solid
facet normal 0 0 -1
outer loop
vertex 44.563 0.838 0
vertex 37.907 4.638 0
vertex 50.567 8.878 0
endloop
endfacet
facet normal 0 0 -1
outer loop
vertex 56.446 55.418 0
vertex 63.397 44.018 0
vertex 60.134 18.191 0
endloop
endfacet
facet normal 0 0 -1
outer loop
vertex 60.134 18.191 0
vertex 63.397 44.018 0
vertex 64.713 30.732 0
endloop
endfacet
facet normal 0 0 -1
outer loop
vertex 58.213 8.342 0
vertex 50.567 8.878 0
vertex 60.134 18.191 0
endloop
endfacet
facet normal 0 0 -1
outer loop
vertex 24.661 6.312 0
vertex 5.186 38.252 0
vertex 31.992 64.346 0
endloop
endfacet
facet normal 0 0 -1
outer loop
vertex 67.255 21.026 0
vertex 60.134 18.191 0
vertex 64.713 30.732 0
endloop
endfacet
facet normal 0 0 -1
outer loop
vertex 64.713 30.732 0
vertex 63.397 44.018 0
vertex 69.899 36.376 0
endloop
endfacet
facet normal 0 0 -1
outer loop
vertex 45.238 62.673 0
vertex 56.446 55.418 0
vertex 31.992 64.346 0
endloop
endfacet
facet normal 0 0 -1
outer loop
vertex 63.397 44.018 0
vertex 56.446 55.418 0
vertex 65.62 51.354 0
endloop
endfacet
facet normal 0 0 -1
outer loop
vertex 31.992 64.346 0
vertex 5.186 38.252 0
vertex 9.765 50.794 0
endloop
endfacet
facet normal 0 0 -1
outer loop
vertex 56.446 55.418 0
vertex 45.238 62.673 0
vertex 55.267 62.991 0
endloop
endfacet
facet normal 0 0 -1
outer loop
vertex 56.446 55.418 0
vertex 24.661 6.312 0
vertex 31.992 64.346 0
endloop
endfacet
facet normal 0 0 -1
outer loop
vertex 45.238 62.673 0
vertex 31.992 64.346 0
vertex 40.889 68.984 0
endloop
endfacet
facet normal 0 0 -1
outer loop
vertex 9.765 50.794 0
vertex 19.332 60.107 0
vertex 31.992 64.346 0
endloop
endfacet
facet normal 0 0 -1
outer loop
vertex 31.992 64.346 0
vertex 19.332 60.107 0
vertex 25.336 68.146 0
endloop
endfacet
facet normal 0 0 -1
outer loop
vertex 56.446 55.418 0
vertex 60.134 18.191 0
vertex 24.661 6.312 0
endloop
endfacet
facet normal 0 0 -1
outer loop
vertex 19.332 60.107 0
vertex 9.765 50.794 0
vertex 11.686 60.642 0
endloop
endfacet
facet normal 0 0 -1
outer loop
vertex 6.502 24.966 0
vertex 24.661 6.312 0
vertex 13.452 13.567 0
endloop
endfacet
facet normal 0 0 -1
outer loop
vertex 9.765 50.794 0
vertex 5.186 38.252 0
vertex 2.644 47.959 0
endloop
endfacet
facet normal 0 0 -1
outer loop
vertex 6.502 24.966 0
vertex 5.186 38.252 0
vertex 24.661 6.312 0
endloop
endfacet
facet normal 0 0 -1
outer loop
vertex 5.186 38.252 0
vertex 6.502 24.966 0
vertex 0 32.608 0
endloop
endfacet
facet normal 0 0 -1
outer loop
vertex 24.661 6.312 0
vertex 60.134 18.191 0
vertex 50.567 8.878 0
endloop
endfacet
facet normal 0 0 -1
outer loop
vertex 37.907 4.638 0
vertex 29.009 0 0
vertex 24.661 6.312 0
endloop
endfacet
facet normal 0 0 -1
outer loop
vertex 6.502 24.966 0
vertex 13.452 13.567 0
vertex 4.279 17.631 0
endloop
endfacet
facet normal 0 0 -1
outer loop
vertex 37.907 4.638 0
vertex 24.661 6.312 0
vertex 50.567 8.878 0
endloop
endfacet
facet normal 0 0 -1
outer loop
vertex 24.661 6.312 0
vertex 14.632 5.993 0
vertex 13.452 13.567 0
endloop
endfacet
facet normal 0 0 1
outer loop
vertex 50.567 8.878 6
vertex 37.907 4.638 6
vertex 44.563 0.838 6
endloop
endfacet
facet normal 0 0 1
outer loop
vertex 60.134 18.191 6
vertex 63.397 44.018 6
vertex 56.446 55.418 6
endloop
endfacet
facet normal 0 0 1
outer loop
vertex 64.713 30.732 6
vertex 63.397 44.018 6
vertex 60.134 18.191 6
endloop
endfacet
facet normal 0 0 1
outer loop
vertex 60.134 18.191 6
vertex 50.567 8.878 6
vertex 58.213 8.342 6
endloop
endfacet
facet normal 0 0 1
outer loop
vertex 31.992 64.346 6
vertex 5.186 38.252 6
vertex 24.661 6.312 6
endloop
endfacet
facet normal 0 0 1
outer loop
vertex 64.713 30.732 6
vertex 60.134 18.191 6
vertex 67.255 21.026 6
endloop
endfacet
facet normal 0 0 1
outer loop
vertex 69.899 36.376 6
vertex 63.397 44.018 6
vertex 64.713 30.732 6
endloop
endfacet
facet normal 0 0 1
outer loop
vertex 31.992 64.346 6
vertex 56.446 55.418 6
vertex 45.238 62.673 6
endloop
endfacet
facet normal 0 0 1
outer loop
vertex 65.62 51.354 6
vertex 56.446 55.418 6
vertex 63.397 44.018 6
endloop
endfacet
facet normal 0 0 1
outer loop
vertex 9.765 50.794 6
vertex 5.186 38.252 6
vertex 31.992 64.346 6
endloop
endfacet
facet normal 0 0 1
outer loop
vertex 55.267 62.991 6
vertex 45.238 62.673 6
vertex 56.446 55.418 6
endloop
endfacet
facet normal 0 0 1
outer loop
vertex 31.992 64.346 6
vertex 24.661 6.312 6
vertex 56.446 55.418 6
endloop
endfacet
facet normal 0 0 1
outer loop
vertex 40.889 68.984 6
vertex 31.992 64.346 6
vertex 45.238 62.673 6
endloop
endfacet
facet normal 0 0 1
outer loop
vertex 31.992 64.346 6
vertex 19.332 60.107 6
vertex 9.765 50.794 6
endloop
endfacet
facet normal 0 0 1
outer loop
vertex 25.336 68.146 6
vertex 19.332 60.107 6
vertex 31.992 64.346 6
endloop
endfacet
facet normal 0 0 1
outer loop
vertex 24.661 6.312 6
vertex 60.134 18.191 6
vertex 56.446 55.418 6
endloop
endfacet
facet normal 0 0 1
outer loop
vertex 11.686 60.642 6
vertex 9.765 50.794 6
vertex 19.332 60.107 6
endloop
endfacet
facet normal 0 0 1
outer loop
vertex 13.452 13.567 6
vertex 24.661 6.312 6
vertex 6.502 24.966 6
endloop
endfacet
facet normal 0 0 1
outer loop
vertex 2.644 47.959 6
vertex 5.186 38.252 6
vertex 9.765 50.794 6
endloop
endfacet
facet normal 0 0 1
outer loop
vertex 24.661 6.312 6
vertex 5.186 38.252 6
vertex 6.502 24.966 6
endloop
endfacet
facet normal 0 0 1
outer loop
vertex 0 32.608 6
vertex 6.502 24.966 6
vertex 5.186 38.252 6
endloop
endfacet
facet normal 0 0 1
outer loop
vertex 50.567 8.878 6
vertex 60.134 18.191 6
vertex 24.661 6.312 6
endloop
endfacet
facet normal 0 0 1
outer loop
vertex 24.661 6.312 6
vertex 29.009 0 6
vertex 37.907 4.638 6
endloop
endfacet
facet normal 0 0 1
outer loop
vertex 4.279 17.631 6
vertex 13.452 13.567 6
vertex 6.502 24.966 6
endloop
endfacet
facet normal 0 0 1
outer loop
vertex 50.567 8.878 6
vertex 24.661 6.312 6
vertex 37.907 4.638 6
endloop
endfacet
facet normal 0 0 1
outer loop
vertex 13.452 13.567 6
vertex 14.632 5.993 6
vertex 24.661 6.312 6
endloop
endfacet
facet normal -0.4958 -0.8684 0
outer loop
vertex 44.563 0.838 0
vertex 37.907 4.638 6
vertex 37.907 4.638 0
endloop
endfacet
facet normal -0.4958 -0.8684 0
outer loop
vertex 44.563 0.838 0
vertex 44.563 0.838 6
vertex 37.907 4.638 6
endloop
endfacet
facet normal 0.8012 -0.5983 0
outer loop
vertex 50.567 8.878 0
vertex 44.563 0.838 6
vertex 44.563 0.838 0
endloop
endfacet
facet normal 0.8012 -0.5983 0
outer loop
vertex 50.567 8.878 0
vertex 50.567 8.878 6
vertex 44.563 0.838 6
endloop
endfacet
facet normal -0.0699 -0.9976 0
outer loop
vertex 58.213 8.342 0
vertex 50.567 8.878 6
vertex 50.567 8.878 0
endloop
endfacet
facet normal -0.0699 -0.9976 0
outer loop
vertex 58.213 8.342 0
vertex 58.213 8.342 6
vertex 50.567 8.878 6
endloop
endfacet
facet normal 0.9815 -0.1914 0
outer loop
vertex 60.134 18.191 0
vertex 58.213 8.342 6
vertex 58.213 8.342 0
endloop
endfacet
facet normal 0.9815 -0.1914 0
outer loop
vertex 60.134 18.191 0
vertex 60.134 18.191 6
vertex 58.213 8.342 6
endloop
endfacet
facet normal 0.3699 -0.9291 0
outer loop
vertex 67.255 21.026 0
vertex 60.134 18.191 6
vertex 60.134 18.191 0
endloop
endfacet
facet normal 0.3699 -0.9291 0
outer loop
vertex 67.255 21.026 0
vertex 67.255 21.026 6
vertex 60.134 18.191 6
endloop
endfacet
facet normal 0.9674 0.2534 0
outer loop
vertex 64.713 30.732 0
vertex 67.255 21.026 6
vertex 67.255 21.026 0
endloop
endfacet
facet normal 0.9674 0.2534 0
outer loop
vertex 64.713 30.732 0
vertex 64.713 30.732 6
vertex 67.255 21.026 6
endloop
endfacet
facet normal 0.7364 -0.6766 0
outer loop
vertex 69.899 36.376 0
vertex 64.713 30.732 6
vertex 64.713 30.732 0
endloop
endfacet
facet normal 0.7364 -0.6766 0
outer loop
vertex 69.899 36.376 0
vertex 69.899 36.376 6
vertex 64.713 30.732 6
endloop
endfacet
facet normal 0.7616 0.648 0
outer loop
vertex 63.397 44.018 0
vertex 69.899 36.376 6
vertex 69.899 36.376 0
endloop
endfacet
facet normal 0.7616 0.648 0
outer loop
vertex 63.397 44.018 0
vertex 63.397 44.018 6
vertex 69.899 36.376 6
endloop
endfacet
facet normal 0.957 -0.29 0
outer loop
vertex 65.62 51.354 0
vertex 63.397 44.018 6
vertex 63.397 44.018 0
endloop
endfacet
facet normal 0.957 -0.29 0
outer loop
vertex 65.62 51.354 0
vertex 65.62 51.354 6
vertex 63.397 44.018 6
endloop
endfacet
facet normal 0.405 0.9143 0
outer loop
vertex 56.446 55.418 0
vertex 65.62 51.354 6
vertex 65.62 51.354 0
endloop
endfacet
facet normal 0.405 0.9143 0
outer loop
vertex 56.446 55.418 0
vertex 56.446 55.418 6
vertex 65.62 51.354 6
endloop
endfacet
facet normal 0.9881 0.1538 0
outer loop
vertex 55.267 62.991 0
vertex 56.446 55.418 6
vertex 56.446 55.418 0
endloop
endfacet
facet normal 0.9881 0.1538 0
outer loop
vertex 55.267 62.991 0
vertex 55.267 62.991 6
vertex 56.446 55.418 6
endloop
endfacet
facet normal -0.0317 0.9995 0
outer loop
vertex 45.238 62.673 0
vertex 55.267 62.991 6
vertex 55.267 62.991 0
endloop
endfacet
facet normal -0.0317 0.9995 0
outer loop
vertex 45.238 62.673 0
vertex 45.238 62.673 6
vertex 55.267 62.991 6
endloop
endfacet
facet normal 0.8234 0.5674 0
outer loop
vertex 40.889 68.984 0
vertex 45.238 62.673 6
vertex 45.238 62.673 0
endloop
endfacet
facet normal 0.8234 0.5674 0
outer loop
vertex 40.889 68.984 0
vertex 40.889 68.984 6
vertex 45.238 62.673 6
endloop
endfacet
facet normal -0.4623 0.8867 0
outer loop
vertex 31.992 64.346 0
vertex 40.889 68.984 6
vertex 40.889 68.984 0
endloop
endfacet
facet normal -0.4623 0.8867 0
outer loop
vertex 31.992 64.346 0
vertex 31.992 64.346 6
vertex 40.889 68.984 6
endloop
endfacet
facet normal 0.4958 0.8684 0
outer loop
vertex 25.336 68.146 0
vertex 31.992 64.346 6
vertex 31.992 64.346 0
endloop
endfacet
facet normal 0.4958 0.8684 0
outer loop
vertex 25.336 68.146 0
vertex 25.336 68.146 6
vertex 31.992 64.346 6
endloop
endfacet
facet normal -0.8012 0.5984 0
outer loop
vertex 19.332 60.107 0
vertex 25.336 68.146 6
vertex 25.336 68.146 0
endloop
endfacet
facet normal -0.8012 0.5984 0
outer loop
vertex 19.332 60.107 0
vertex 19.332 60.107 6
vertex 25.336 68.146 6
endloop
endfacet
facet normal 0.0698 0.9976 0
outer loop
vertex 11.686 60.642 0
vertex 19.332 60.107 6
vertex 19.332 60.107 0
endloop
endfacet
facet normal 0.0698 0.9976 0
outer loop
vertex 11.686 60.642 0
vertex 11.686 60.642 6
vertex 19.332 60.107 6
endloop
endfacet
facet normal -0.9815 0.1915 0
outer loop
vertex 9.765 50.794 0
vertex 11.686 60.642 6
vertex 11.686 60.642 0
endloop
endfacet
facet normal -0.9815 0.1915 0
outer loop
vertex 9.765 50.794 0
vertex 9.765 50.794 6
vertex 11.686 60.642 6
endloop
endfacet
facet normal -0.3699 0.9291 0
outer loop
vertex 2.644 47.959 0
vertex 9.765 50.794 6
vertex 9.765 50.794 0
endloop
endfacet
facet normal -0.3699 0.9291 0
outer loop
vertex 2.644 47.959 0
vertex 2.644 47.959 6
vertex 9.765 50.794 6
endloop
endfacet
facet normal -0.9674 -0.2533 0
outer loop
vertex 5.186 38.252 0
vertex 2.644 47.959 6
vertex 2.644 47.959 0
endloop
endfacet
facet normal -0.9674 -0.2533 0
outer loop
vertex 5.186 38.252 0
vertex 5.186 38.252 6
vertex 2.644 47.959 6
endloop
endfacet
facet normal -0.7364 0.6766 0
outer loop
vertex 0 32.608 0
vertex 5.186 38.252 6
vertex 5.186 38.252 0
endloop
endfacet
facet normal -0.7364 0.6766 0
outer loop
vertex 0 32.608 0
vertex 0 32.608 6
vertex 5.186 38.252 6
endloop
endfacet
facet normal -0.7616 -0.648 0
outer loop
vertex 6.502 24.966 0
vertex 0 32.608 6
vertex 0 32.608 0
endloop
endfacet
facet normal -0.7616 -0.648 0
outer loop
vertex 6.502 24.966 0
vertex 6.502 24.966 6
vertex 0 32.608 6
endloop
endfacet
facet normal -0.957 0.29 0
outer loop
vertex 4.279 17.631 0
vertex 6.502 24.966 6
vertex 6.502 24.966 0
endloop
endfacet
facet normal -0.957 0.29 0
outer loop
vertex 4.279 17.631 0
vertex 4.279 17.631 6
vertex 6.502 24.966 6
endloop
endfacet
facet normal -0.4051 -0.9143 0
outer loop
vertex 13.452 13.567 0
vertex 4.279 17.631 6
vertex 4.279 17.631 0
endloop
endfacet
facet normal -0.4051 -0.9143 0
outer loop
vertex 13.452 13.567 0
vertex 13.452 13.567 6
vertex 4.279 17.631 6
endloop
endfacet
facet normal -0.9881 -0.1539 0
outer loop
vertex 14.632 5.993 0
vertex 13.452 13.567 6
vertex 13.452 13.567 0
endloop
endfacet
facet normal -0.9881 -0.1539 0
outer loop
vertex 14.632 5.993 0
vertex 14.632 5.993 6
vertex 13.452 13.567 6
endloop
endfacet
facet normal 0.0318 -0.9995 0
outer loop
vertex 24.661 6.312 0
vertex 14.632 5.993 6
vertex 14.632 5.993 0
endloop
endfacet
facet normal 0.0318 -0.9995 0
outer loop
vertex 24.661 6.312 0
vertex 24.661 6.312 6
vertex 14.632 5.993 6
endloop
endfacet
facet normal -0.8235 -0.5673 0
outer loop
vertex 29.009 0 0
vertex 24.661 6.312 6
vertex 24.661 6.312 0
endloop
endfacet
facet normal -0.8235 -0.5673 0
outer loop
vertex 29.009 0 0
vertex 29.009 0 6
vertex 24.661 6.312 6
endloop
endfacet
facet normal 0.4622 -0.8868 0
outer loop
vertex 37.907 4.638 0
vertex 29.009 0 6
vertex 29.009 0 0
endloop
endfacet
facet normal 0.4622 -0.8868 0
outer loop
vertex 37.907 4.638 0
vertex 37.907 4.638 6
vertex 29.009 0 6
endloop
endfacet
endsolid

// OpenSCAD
$fn = 32;

// ----------------------------------------------------------------------
// Chain sprocket: 14 teeth, 30 mm root radius
// ----------------------------------------------------------------------

// --- parameters (mm) ---
profile_height = 6;       // extrusion height
profile_points = 28;      // points of the closed outline

profile = [[64.713, 30.732], [69.899, 36.376], [63.397, 44.018], [65.62, 51.354], [56.446, 55.418], [55.267, 62.991], [45.238, 62.673], [40.889, 68.984], [31.992, 64.346], [25.336, 68.146], [19.332, 60.107], [11.686, 60.642], [9.765, 50.794], [2.644, 47.959], [5.186, 38.252], [0, 32.608], [6.502, 24.966], [4.279, 17.631], [13.452, 13.567], [14.632, 5.993], [24.661, 6.312], [29.009, 0], [37.907, 4.638], [44.563, 0.838], [50.567, 8.878], [58.213, 8.342], [60.134, 18.191], [67.255, 21.026]];  // single closed polygon, 28 points, counter clockwise

// --- the one profile operation ---
linear_extrude(height = profile_height) polygon(points = profile);
